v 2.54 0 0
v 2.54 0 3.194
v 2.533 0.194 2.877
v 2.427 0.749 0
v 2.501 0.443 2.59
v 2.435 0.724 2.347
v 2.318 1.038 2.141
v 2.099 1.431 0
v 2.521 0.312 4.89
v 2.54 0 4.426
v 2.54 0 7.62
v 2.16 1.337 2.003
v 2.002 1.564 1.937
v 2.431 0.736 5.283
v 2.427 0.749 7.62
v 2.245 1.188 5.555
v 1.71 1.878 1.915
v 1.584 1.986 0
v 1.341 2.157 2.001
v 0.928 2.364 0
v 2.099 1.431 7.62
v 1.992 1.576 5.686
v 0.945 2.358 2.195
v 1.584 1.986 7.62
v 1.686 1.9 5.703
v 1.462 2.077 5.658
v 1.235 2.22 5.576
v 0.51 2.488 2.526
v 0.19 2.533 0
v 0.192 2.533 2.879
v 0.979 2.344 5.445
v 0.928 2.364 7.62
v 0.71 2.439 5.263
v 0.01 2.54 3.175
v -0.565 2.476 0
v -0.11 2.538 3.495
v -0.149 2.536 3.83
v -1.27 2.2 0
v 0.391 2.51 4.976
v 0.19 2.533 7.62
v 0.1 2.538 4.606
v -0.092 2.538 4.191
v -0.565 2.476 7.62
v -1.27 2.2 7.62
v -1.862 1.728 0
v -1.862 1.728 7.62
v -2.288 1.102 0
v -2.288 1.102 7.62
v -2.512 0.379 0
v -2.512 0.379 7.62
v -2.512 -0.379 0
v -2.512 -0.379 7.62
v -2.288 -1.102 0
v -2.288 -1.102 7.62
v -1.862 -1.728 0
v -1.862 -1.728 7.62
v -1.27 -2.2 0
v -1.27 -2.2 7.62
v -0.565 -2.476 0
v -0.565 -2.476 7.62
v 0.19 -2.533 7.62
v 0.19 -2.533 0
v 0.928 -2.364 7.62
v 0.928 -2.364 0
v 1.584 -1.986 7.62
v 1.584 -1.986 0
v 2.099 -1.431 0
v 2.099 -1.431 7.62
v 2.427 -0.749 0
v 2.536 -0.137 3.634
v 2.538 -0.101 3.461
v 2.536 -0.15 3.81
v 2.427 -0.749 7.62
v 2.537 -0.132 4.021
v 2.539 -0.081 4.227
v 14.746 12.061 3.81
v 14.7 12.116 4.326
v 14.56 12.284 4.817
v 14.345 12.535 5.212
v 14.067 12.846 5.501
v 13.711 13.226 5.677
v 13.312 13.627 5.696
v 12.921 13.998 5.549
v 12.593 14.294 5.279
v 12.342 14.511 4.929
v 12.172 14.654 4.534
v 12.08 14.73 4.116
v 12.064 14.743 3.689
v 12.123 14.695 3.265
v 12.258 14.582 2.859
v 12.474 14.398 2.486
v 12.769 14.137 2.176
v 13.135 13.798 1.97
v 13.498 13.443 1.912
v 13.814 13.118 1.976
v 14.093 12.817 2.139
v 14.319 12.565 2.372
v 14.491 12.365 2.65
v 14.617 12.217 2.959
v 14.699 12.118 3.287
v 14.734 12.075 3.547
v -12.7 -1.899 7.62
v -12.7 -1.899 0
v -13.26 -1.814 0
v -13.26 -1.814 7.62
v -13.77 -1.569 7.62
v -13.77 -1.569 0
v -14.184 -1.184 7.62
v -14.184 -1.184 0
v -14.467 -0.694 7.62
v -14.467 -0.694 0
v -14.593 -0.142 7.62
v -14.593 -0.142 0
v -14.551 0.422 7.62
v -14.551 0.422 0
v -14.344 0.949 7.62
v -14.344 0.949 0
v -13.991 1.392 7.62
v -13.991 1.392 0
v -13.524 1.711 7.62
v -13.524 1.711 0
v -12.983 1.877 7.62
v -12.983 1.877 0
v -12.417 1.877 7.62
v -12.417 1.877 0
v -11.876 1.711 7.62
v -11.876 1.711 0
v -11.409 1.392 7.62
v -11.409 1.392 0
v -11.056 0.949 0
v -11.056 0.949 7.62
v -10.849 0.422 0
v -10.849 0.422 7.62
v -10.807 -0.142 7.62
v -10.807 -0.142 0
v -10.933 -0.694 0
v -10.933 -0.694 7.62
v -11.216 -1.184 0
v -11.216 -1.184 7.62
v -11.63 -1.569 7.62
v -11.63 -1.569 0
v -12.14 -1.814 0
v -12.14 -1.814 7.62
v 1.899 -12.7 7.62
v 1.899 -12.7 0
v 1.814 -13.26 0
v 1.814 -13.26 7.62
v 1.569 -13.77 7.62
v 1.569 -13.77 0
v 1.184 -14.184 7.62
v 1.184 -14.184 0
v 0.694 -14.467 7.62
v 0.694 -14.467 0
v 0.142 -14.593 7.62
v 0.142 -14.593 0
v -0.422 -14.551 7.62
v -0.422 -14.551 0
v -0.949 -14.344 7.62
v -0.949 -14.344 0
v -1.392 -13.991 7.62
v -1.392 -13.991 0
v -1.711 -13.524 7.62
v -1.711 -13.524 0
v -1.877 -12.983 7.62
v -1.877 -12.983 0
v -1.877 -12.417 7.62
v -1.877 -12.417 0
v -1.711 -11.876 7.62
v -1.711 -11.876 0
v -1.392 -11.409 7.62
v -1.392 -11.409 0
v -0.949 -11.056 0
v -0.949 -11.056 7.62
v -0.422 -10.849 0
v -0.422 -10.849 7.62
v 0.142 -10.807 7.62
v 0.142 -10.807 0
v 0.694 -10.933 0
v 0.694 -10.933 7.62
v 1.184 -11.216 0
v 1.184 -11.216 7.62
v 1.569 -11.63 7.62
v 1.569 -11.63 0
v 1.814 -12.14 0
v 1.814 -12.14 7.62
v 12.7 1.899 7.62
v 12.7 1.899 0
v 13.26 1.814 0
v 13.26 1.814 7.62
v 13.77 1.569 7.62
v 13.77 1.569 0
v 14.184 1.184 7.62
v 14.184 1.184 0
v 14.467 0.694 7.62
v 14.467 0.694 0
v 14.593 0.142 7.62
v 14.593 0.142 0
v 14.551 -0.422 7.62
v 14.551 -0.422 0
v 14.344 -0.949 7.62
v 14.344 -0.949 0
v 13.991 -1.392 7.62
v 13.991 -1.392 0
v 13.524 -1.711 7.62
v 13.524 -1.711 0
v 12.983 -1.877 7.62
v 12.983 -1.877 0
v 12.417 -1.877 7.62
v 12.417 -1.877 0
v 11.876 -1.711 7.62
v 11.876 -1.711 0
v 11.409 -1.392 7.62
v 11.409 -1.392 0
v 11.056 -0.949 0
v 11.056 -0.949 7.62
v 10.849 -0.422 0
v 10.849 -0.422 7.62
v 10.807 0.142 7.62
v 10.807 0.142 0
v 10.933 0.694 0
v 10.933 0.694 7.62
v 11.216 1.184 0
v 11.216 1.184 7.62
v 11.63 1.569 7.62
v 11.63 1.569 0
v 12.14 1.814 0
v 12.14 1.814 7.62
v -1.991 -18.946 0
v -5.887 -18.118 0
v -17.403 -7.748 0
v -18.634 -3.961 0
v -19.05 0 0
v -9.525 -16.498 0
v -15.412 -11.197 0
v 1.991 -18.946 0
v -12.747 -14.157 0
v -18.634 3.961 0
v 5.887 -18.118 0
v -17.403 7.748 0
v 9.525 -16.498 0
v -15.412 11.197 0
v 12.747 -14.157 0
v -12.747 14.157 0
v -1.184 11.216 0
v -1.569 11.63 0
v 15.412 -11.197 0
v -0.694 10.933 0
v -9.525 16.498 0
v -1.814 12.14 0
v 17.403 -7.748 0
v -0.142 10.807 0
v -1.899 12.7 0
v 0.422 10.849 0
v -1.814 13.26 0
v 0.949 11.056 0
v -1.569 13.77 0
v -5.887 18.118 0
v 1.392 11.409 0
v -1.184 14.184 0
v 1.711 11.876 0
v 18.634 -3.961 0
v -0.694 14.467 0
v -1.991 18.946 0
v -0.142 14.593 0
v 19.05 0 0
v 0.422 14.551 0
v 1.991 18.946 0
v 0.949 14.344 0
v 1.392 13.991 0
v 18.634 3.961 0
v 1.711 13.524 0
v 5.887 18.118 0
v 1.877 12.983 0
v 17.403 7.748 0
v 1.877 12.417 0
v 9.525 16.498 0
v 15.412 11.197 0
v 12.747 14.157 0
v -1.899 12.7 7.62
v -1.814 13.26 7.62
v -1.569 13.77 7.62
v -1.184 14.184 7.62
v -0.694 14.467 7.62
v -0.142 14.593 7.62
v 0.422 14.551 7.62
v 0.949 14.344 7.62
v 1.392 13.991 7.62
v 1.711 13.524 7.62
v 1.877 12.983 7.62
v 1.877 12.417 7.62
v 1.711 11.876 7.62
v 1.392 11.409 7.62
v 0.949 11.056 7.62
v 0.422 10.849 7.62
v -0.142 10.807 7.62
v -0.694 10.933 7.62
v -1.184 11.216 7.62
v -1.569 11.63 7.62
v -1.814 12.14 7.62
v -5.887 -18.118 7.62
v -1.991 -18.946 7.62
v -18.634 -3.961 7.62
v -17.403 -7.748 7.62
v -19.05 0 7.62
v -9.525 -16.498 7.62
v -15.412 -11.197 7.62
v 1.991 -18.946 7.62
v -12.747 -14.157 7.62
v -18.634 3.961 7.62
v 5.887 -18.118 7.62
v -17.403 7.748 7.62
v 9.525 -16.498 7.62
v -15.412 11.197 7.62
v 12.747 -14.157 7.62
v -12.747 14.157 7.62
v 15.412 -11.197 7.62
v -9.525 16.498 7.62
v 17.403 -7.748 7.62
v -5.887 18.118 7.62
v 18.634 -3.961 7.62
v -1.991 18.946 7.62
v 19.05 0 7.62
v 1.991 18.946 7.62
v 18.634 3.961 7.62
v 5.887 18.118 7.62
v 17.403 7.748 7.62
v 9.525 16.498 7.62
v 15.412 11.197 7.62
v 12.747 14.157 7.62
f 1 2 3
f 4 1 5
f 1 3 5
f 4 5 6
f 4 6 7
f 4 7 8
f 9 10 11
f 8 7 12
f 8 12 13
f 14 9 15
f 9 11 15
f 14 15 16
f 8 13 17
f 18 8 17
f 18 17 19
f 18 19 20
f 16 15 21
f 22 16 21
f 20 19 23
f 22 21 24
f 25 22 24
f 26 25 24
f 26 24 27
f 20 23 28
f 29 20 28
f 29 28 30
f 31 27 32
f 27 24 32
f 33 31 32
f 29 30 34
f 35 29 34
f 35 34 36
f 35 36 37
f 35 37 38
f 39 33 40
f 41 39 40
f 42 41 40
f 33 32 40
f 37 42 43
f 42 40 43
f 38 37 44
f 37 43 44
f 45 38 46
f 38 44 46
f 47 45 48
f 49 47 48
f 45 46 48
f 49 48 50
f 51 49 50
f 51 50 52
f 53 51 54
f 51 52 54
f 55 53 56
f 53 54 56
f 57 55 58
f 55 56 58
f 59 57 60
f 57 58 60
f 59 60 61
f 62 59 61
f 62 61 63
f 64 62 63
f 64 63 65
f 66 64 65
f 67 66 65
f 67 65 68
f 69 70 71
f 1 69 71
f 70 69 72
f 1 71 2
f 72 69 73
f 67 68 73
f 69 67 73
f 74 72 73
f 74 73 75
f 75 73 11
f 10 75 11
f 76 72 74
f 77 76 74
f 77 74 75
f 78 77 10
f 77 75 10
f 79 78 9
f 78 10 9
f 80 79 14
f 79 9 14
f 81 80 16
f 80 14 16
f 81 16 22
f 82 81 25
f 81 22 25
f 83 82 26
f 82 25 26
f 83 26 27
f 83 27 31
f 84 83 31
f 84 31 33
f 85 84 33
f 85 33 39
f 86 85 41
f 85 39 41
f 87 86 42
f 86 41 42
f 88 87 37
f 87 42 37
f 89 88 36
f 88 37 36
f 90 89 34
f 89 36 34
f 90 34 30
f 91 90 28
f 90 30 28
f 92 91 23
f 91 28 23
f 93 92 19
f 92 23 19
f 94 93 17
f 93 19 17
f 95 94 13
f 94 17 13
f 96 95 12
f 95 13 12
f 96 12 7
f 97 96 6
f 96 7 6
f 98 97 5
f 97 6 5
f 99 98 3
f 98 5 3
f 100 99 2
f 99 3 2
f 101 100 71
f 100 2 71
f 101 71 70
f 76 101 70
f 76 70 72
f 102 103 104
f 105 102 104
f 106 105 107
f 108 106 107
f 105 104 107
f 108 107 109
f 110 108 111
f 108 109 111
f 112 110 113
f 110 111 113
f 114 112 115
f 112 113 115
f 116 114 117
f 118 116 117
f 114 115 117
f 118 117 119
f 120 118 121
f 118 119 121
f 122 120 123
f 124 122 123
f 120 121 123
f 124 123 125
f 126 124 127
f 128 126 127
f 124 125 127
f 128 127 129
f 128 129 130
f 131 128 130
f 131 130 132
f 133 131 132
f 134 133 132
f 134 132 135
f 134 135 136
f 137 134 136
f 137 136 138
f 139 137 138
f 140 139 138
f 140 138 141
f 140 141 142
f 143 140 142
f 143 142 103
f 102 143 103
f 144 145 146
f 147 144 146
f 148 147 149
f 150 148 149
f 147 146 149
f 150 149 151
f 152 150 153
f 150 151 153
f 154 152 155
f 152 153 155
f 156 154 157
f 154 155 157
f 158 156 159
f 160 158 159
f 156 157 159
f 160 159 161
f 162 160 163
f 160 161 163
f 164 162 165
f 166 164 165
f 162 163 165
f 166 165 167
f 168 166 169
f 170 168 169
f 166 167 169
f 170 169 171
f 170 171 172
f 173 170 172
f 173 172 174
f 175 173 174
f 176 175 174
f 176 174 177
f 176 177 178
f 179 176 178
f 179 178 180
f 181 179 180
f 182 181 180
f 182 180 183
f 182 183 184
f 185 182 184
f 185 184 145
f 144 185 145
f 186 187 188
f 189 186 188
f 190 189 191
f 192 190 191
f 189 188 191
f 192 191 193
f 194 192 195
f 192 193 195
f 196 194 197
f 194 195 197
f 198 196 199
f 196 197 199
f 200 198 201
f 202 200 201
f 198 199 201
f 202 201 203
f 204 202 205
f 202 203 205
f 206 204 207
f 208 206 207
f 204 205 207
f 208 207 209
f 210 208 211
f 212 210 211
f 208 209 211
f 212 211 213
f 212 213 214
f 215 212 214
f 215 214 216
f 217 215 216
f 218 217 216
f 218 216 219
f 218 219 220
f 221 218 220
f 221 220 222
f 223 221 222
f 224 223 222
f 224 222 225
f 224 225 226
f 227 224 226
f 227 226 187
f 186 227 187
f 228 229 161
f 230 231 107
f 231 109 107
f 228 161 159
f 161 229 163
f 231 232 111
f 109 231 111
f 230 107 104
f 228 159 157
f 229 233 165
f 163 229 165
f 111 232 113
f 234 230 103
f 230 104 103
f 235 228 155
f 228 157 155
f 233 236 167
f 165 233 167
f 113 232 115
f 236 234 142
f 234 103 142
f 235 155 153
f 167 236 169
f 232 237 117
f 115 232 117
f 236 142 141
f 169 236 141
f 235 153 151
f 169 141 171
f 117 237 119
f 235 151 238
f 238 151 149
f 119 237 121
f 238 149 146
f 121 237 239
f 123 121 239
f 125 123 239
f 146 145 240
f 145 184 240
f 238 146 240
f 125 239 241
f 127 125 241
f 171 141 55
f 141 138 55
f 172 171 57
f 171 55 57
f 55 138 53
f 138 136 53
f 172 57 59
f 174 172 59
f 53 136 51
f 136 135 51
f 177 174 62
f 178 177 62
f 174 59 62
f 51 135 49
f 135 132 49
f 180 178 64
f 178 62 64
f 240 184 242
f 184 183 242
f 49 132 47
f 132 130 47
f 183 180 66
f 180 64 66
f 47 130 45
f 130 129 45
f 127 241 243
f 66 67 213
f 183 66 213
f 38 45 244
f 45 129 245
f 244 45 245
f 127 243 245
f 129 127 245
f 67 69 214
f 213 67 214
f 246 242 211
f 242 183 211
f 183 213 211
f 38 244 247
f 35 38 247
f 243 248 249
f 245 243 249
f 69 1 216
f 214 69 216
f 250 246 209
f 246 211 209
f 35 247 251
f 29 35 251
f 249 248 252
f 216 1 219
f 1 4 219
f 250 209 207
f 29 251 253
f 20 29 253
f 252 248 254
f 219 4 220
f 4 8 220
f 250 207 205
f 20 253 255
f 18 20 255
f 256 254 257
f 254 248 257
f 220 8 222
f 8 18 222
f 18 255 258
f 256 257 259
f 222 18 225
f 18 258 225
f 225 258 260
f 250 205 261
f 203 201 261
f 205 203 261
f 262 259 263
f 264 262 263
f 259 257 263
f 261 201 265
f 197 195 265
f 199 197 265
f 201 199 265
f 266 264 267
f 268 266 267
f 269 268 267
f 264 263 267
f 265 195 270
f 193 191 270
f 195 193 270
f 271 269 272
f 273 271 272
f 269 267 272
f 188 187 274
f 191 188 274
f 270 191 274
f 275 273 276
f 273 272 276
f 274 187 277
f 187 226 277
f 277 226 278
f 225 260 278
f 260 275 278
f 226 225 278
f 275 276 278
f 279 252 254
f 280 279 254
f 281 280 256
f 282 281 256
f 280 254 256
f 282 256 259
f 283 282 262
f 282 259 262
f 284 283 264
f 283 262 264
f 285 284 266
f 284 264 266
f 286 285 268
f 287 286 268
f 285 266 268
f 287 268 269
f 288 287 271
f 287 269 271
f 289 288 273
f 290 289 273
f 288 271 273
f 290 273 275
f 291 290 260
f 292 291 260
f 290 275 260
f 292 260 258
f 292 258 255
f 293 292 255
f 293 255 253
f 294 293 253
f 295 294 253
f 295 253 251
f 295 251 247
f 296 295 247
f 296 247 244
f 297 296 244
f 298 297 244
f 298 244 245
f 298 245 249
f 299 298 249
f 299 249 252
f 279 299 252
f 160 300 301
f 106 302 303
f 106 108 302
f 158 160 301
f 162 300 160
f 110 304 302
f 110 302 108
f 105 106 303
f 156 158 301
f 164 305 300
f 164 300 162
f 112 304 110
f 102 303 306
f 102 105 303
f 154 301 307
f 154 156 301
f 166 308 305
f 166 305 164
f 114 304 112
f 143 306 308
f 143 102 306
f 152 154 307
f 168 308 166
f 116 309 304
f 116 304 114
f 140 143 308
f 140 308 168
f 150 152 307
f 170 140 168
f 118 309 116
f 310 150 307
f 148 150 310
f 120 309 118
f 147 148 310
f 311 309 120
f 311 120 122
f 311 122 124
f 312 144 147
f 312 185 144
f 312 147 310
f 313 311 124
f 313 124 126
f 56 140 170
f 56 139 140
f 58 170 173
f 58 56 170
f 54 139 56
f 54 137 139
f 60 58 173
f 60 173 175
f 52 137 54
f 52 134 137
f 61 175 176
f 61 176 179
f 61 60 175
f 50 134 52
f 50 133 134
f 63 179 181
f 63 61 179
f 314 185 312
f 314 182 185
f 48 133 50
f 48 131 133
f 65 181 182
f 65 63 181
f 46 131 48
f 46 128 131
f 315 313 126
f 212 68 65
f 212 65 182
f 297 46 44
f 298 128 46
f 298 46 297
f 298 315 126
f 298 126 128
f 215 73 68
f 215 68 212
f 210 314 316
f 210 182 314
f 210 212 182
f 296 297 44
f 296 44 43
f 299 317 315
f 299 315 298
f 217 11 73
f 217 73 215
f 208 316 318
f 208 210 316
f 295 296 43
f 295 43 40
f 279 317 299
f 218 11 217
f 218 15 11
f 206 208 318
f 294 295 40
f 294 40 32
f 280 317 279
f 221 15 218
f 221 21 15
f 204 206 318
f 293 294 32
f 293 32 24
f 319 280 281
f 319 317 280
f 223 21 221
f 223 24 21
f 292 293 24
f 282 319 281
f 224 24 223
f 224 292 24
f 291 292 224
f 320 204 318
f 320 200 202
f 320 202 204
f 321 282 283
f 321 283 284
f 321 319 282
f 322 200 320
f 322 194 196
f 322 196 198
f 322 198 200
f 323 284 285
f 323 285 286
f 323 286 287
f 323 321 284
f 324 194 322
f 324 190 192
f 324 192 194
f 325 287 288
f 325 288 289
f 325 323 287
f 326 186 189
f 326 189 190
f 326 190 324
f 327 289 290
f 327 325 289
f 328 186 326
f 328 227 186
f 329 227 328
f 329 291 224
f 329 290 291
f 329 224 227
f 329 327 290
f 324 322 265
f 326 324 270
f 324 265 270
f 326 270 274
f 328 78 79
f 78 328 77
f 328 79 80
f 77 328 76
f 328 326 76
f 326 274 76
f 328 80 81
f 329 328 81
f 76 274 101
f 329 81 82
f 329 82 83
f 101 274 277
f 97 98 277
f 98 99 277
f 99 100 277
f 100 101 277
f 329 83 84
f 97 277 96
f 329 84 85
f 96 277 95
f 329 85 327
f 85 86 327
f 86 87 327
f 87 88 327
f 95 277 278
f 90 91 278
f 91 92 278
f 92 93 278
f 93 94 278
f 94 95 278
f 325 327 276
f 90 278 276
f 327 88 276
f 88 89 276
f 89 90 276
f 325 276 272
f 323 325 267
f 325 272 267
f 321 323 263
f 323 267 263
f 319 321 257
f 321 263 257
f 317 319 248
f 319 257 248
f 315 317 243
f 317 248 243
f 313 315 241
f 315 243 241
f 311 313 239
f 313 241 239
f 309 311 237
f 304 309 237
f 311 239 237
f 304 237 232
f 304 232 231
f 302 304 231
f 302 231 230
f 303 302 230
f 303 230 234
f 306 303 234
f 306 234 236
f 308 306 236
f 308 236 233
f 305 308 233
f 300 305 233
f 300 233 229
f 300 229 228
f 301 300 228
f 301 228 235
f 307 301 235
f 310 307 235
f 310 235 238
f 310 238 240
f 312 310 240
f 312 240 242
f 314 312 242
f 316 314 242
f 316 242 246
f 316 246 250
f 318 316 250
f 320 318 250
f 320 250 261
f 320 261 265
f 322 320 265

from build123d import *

# Parameters (mm, degrees)
SKETCH1_R                  = 19.05
BOSS_EXTRUDE1_DEPTH        = 7.62
SKETCH2_R                  = 2.54
CUT_EXTRUDE1_DEPTH         = 8.62
F_10_24_TAPPED_HOLE1_D     = 3.7973
CIRPATTERN1_COUNT          = 4
F_10_24_TAPPED_HOLE4_D     = 3.7973
F_10_24_TAPPED_HOLE4_DEPTH = 20.0279
F_10_24_TAPPED_HOLE4_TIP   = 1.140824014


with BuildPart() as part:
    # Sketch1 → Boss-Extrude1 (new body)
    with BuildSketch(Plane.XY):
        Circle(SKETCH1_R)
    extrude(amount=BOSS_EXTRUDE1_DEPTH)

    # Sketch2 → Cut-Extrude1 (cut, through all)
    with BuildSketch(Plane.XY.offset(7.62)):
        Circle(SKETCH2_R)
    extrude(amount=-CUT_EXTRUDE1_DEPTH, mode=Mode.SUBTRACT)

    # #10-24 Tapped Hole1 (through all)
    with Locations(Plane.XY.offset(7.62)):
        with Locations((0, 12.7)):
            f_10_24_tapped_hole1 = Hole(F_10_24_TAPPED_HOLE1_D / 2)

    # CirPattern1: #10-24 Tapped Hole1 ×4 about axis
    cirpattern1_axis = Axis((0, 0, 0), (0, 0, 1))
    for i in range(1, CIRPATTERN1_COUNT):
        add(f_10_24_tapped_hole1.rotate(cirpattern1_axis, i * 360 / CIRPATTERN1_COUNT), mode=Mode.SUBTRACT)

    # #10-24 Tapped Hole4
    with Locations(Plane(origin=(13.470384182, 13.470384182, 7.62), x_dir=(-0.707106781, 0.707106781, 0), z_dir=(0.707106781, 0.707106781, 0))):
        with Locations((0, -3.81)):
            Hole(F_10_24_TAPPED_HOLE4_D / 2, depth=F_10_24_TAPPED_HOLE4_DEPTH)
            with Locations((0, 0, -(F_10_24_TAPPED_HOLE4_DEPTH + F_10_24_TAPPED_HOLE4_TIP / 2))):  # 118° drill point
                Cone(0, F_10_24_TAPPED_HOLE4_D / 2, F_10_24_TAPPED_HOLE4_TIP, mode=Mode.SUBTRACT)


solid = part.part
